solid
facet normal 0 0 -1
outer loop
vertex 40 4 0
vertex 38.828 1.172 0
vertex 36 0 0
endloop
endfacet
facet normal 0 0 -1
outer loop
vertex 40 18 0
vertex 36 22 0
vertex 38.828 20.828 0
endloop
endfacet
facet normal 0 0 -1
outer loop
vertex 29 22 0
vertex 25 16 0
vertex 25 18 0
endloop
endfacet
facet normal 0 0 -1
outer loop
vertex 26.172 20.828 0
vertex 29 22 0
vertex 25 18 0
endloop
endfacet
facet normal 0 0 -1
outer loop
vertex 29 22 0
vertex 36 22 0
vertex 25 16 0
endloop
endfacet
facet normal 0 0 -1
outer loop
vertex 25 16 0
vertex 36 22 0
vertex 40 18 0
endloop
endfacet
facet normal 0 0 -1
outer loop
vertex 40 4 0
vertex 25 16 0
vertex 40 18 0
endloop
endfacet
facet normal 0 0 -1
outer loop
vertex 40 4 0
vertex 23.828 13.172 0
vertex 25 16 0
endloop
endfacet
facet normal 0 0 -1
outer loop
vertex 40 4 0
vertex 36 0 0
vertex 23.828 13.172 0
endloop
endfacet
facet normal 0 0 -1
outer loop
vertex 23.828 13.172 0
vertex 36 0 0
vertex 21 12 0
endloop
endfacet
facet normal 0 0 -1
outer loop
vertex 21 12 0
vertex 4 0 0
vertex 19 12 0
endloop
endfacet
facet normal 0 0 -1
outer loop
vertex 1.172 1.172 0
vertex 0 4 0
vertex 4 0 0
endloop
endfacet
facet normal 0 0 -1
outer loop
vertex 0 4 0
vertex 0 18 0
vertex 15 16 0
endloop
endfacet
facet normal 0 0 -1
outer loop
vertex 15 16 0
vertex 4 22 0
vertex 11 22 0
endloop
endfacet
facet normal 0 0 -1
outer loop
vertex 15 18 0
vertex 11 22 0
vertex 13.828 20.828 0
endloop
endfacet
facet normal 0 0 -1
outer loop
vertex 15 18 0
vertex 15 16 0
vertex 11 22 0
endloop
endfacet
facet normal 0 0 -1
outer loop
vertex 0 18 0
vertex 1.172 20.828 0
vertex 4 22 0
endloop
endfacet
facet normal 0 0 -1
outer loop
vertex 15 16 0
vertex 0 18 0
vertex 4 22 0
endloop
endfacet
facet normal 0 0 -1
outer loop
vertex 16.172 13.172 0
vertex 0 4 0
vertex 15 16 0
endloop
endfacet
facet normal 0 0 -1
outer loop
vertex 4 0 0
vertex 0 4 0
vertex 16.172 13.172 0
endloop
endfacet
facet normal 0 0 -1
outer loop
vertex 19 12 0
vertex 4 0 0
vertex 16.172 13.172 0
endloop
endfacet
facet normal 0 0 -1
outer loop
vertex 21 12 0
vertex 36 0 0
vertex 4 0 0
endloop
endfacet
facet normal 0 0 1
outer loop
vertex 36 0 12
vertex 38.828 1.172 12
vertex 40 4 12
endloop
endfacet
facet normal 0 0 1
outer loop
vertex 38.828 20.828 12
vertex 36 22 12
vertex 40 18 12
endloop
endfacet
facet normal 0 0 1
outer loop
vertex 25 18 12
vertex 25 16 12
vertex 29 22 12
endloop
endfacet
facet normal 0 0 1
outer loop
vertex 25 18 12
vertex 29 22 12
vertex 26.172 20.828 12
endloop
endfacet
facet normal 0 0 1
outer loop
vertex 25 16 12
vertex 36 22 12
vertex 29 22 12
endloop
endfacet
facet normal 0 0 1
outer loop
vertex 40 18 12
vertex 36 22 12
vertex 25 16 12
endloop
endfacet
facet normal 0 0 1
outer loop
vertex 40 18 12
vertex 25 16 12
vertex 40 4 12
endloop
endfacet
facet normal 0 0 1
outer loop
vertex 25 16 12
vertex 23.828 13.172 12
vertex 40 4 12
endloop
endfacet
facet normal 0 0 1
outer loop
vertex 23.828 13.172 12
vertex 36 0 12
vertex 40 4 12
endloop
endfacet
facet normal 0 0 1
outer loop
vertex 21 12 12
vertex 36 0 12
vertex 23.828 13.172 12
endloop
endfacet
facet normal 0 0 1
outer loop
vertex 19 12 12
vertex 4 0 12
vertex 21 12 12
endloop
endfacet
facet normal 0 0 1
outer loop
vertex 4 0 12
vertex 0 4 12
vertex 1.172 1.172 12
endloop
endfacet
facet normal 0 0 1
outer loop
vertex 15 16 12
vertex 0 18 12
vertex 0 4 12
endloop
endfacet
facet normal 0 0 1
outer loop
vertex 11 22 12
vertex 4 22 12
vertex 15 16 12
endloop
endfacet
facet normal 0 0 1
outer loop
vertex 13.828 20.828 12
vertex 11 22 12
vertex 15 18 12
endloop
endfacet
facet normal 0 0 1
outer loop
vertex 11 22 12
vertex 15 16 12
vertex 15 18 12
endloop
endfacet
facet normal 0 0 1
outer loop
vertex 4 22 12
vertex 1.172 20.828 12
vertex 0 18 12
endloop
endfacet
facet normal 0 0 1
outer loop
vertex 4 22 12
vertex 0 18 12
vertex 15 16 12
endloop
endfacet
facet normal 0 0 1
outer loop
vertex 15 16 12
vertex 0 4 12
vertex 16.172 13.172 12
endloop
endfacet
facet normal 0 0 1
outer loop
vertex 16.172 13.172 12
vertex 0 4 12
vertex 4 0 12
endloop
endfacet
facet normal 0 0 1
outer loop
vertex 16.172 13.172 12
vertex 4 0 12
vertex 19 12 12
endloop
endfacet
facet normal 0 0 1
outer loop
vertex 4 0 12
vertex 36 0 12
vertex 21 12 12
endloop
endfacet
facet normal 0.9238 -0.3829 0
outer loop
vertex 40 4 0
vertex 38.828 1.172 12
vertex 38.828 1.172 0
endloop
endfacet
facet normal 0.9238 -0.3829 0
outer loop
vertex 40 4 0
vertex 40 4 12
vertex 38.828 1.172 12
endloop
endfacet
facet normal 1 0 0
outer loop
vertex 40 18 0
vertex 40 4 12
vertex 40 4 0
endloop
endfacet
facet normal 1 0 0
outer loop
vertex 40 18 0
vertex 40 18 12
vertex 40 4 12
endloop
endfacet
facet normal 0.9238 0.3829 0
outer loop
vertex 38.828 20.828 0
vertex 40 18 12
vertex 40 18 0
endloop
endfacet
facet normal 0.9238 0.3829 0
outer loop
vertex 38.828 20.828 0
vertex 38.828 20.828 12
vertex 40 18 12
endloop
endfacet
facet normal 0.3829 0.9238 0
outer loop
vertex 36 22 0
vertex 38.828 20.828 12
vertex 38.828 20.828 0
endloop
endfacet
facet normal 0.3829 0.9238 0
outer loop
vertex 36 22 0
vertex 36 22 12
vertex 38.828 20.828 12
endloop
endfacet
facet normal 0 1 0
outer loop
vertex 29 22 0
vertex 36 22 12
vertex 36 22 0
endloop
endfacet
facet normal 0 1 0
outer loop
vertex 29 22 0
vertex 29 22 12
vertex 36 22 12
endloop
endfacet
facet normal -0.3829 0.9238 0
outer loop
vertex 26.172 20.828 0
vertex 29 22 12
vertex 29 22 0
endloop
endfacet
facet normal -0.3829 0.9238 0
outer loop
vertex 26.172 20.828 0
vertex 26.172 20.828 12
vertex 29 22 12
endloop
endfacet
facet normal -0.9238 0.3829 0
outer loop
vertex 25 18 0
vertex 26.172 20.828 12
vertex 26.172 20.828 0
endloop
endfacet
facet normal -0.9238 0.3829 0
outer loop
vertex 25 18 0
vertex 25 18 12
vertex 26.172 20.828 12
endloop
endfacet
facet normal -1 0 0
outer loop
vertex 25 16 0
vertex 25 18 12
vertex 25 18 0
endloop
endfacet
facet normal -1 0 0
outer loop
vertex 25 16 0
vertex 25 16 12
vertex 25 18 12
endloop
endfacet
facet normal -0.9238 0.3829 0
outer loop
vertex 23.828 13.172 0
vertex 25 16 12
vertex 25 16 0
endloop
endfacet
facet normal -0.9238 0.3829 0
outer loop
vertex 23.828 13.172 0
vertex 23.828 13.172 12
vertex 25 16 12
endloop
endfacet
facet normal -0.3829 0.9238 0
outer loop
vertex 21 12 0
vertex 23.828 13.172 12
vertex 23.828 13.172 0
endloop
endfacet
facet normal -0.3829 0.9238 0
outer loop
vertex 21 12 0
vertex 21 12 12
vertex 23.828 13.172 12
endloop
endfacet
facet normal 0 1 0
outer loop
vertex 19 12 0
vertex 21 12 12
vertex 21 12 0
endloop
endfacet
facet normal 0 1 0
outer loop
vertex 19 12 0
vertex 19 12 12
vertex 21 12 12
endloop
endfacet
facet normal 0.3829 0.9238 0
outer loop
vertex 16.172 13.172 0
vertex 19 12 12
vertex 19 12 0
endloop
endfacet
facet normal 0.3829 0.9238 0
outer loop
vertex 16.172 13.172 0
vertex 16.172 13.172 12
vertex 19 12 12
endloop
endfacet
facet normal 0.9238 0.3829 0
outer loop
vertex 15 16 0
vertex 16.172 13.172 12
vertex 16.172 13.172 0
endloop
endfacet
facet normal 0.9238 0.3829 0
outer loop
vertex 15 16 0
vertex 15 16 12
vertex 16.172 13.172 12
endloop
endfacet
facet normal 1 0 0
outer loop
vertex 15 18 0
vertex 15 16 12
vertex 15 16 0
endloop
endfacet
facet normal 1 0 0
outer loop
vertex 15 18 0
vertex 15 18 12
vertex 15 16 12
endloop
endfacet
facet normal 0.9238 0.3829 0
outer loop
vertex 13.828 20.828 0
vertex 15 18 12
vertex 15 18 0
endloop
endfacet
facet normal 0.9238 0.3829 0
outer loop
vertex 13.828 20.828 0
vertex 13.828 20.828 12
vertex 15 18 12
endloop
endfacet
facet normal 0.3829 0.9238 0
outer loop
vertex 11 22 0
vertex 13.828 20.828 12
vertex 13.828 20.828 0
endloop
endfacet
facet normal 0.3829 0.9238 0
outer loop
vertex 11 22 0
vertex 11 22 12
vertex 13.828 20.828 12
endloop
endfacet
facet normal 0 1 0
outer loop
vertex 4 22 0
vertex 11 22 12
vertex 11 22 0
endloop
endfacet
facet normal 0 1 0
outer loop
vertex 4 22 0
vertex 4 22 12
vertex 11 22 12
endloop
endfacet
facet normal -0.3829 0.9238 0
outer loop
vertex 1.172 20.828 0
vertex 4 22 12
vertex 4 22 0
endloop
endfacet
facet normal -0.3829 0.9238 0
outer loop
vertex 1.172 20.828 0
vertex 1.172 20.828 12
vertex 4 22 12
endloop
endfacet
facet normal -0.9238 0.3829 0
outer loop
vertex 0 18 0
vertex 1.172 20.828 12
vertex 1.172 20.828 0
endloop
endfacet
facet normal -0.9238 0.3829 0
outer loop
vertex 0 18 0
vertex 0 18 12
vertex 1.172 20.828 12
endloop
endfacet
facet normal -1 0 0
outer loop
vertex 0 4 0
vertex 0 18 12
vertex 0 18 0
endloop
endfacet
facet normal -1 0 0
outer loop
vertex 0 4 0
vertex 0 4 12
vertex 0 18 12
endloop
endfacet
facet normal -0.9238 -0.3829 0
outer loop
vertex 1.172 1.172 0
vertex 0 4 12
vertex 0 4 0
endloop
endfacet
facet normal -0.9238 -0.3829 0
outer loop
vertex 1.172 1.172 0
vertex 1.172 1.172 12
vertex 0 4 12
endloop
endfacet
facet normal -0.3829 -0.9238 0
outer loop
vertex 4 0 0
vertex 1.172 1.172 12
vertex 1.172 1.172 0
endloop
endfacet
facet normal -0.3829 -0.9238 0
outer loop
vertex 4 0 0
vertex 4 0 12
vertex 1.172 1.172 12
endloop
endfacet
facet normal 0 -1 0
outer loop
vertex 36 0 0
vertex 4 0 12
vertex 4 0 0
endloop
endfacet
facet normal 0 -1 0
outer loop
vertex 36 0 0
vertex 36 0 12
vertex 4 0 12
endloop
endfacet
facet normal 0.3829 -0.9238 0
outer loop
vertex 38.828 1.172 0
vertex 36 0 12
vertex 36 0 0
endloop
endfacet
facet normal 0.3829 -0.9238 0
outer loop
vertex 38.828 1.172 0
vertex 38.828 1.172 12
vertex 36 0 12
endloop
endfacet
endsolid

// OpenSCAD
$fn = 32;

// ----------------------------------------------------------------------
// Eye lug: clevis, 12 mm thick
// ----------------------------------------------------------------------

// --- parameters (mm) ---
profile_height = 12;      // extrusion height
profile_points = 24;      // points of the closed outline

profile = [[0, 4], [1.172, 1.172], [4, 0], [36, 0], [38.828, 1.172], [40, 4], [40, 18], [38.828, 20.828], [36, 22], [29, 22], [26.172, 20.828], [25, 18], [25, 16], [23.828, 13.172], [21, 12], [19, 12], [16.172, 13.172], [15, 16], [15, 18], [13.828, 20.828], [11, 22], [4, 22], [1.172, 20.828], [0, 18]];  // single closed polygon, 24 points, counter clockwise

// --- the one profile operation ---
linear_extrude(height = profile_height) polygon(points = profile);
